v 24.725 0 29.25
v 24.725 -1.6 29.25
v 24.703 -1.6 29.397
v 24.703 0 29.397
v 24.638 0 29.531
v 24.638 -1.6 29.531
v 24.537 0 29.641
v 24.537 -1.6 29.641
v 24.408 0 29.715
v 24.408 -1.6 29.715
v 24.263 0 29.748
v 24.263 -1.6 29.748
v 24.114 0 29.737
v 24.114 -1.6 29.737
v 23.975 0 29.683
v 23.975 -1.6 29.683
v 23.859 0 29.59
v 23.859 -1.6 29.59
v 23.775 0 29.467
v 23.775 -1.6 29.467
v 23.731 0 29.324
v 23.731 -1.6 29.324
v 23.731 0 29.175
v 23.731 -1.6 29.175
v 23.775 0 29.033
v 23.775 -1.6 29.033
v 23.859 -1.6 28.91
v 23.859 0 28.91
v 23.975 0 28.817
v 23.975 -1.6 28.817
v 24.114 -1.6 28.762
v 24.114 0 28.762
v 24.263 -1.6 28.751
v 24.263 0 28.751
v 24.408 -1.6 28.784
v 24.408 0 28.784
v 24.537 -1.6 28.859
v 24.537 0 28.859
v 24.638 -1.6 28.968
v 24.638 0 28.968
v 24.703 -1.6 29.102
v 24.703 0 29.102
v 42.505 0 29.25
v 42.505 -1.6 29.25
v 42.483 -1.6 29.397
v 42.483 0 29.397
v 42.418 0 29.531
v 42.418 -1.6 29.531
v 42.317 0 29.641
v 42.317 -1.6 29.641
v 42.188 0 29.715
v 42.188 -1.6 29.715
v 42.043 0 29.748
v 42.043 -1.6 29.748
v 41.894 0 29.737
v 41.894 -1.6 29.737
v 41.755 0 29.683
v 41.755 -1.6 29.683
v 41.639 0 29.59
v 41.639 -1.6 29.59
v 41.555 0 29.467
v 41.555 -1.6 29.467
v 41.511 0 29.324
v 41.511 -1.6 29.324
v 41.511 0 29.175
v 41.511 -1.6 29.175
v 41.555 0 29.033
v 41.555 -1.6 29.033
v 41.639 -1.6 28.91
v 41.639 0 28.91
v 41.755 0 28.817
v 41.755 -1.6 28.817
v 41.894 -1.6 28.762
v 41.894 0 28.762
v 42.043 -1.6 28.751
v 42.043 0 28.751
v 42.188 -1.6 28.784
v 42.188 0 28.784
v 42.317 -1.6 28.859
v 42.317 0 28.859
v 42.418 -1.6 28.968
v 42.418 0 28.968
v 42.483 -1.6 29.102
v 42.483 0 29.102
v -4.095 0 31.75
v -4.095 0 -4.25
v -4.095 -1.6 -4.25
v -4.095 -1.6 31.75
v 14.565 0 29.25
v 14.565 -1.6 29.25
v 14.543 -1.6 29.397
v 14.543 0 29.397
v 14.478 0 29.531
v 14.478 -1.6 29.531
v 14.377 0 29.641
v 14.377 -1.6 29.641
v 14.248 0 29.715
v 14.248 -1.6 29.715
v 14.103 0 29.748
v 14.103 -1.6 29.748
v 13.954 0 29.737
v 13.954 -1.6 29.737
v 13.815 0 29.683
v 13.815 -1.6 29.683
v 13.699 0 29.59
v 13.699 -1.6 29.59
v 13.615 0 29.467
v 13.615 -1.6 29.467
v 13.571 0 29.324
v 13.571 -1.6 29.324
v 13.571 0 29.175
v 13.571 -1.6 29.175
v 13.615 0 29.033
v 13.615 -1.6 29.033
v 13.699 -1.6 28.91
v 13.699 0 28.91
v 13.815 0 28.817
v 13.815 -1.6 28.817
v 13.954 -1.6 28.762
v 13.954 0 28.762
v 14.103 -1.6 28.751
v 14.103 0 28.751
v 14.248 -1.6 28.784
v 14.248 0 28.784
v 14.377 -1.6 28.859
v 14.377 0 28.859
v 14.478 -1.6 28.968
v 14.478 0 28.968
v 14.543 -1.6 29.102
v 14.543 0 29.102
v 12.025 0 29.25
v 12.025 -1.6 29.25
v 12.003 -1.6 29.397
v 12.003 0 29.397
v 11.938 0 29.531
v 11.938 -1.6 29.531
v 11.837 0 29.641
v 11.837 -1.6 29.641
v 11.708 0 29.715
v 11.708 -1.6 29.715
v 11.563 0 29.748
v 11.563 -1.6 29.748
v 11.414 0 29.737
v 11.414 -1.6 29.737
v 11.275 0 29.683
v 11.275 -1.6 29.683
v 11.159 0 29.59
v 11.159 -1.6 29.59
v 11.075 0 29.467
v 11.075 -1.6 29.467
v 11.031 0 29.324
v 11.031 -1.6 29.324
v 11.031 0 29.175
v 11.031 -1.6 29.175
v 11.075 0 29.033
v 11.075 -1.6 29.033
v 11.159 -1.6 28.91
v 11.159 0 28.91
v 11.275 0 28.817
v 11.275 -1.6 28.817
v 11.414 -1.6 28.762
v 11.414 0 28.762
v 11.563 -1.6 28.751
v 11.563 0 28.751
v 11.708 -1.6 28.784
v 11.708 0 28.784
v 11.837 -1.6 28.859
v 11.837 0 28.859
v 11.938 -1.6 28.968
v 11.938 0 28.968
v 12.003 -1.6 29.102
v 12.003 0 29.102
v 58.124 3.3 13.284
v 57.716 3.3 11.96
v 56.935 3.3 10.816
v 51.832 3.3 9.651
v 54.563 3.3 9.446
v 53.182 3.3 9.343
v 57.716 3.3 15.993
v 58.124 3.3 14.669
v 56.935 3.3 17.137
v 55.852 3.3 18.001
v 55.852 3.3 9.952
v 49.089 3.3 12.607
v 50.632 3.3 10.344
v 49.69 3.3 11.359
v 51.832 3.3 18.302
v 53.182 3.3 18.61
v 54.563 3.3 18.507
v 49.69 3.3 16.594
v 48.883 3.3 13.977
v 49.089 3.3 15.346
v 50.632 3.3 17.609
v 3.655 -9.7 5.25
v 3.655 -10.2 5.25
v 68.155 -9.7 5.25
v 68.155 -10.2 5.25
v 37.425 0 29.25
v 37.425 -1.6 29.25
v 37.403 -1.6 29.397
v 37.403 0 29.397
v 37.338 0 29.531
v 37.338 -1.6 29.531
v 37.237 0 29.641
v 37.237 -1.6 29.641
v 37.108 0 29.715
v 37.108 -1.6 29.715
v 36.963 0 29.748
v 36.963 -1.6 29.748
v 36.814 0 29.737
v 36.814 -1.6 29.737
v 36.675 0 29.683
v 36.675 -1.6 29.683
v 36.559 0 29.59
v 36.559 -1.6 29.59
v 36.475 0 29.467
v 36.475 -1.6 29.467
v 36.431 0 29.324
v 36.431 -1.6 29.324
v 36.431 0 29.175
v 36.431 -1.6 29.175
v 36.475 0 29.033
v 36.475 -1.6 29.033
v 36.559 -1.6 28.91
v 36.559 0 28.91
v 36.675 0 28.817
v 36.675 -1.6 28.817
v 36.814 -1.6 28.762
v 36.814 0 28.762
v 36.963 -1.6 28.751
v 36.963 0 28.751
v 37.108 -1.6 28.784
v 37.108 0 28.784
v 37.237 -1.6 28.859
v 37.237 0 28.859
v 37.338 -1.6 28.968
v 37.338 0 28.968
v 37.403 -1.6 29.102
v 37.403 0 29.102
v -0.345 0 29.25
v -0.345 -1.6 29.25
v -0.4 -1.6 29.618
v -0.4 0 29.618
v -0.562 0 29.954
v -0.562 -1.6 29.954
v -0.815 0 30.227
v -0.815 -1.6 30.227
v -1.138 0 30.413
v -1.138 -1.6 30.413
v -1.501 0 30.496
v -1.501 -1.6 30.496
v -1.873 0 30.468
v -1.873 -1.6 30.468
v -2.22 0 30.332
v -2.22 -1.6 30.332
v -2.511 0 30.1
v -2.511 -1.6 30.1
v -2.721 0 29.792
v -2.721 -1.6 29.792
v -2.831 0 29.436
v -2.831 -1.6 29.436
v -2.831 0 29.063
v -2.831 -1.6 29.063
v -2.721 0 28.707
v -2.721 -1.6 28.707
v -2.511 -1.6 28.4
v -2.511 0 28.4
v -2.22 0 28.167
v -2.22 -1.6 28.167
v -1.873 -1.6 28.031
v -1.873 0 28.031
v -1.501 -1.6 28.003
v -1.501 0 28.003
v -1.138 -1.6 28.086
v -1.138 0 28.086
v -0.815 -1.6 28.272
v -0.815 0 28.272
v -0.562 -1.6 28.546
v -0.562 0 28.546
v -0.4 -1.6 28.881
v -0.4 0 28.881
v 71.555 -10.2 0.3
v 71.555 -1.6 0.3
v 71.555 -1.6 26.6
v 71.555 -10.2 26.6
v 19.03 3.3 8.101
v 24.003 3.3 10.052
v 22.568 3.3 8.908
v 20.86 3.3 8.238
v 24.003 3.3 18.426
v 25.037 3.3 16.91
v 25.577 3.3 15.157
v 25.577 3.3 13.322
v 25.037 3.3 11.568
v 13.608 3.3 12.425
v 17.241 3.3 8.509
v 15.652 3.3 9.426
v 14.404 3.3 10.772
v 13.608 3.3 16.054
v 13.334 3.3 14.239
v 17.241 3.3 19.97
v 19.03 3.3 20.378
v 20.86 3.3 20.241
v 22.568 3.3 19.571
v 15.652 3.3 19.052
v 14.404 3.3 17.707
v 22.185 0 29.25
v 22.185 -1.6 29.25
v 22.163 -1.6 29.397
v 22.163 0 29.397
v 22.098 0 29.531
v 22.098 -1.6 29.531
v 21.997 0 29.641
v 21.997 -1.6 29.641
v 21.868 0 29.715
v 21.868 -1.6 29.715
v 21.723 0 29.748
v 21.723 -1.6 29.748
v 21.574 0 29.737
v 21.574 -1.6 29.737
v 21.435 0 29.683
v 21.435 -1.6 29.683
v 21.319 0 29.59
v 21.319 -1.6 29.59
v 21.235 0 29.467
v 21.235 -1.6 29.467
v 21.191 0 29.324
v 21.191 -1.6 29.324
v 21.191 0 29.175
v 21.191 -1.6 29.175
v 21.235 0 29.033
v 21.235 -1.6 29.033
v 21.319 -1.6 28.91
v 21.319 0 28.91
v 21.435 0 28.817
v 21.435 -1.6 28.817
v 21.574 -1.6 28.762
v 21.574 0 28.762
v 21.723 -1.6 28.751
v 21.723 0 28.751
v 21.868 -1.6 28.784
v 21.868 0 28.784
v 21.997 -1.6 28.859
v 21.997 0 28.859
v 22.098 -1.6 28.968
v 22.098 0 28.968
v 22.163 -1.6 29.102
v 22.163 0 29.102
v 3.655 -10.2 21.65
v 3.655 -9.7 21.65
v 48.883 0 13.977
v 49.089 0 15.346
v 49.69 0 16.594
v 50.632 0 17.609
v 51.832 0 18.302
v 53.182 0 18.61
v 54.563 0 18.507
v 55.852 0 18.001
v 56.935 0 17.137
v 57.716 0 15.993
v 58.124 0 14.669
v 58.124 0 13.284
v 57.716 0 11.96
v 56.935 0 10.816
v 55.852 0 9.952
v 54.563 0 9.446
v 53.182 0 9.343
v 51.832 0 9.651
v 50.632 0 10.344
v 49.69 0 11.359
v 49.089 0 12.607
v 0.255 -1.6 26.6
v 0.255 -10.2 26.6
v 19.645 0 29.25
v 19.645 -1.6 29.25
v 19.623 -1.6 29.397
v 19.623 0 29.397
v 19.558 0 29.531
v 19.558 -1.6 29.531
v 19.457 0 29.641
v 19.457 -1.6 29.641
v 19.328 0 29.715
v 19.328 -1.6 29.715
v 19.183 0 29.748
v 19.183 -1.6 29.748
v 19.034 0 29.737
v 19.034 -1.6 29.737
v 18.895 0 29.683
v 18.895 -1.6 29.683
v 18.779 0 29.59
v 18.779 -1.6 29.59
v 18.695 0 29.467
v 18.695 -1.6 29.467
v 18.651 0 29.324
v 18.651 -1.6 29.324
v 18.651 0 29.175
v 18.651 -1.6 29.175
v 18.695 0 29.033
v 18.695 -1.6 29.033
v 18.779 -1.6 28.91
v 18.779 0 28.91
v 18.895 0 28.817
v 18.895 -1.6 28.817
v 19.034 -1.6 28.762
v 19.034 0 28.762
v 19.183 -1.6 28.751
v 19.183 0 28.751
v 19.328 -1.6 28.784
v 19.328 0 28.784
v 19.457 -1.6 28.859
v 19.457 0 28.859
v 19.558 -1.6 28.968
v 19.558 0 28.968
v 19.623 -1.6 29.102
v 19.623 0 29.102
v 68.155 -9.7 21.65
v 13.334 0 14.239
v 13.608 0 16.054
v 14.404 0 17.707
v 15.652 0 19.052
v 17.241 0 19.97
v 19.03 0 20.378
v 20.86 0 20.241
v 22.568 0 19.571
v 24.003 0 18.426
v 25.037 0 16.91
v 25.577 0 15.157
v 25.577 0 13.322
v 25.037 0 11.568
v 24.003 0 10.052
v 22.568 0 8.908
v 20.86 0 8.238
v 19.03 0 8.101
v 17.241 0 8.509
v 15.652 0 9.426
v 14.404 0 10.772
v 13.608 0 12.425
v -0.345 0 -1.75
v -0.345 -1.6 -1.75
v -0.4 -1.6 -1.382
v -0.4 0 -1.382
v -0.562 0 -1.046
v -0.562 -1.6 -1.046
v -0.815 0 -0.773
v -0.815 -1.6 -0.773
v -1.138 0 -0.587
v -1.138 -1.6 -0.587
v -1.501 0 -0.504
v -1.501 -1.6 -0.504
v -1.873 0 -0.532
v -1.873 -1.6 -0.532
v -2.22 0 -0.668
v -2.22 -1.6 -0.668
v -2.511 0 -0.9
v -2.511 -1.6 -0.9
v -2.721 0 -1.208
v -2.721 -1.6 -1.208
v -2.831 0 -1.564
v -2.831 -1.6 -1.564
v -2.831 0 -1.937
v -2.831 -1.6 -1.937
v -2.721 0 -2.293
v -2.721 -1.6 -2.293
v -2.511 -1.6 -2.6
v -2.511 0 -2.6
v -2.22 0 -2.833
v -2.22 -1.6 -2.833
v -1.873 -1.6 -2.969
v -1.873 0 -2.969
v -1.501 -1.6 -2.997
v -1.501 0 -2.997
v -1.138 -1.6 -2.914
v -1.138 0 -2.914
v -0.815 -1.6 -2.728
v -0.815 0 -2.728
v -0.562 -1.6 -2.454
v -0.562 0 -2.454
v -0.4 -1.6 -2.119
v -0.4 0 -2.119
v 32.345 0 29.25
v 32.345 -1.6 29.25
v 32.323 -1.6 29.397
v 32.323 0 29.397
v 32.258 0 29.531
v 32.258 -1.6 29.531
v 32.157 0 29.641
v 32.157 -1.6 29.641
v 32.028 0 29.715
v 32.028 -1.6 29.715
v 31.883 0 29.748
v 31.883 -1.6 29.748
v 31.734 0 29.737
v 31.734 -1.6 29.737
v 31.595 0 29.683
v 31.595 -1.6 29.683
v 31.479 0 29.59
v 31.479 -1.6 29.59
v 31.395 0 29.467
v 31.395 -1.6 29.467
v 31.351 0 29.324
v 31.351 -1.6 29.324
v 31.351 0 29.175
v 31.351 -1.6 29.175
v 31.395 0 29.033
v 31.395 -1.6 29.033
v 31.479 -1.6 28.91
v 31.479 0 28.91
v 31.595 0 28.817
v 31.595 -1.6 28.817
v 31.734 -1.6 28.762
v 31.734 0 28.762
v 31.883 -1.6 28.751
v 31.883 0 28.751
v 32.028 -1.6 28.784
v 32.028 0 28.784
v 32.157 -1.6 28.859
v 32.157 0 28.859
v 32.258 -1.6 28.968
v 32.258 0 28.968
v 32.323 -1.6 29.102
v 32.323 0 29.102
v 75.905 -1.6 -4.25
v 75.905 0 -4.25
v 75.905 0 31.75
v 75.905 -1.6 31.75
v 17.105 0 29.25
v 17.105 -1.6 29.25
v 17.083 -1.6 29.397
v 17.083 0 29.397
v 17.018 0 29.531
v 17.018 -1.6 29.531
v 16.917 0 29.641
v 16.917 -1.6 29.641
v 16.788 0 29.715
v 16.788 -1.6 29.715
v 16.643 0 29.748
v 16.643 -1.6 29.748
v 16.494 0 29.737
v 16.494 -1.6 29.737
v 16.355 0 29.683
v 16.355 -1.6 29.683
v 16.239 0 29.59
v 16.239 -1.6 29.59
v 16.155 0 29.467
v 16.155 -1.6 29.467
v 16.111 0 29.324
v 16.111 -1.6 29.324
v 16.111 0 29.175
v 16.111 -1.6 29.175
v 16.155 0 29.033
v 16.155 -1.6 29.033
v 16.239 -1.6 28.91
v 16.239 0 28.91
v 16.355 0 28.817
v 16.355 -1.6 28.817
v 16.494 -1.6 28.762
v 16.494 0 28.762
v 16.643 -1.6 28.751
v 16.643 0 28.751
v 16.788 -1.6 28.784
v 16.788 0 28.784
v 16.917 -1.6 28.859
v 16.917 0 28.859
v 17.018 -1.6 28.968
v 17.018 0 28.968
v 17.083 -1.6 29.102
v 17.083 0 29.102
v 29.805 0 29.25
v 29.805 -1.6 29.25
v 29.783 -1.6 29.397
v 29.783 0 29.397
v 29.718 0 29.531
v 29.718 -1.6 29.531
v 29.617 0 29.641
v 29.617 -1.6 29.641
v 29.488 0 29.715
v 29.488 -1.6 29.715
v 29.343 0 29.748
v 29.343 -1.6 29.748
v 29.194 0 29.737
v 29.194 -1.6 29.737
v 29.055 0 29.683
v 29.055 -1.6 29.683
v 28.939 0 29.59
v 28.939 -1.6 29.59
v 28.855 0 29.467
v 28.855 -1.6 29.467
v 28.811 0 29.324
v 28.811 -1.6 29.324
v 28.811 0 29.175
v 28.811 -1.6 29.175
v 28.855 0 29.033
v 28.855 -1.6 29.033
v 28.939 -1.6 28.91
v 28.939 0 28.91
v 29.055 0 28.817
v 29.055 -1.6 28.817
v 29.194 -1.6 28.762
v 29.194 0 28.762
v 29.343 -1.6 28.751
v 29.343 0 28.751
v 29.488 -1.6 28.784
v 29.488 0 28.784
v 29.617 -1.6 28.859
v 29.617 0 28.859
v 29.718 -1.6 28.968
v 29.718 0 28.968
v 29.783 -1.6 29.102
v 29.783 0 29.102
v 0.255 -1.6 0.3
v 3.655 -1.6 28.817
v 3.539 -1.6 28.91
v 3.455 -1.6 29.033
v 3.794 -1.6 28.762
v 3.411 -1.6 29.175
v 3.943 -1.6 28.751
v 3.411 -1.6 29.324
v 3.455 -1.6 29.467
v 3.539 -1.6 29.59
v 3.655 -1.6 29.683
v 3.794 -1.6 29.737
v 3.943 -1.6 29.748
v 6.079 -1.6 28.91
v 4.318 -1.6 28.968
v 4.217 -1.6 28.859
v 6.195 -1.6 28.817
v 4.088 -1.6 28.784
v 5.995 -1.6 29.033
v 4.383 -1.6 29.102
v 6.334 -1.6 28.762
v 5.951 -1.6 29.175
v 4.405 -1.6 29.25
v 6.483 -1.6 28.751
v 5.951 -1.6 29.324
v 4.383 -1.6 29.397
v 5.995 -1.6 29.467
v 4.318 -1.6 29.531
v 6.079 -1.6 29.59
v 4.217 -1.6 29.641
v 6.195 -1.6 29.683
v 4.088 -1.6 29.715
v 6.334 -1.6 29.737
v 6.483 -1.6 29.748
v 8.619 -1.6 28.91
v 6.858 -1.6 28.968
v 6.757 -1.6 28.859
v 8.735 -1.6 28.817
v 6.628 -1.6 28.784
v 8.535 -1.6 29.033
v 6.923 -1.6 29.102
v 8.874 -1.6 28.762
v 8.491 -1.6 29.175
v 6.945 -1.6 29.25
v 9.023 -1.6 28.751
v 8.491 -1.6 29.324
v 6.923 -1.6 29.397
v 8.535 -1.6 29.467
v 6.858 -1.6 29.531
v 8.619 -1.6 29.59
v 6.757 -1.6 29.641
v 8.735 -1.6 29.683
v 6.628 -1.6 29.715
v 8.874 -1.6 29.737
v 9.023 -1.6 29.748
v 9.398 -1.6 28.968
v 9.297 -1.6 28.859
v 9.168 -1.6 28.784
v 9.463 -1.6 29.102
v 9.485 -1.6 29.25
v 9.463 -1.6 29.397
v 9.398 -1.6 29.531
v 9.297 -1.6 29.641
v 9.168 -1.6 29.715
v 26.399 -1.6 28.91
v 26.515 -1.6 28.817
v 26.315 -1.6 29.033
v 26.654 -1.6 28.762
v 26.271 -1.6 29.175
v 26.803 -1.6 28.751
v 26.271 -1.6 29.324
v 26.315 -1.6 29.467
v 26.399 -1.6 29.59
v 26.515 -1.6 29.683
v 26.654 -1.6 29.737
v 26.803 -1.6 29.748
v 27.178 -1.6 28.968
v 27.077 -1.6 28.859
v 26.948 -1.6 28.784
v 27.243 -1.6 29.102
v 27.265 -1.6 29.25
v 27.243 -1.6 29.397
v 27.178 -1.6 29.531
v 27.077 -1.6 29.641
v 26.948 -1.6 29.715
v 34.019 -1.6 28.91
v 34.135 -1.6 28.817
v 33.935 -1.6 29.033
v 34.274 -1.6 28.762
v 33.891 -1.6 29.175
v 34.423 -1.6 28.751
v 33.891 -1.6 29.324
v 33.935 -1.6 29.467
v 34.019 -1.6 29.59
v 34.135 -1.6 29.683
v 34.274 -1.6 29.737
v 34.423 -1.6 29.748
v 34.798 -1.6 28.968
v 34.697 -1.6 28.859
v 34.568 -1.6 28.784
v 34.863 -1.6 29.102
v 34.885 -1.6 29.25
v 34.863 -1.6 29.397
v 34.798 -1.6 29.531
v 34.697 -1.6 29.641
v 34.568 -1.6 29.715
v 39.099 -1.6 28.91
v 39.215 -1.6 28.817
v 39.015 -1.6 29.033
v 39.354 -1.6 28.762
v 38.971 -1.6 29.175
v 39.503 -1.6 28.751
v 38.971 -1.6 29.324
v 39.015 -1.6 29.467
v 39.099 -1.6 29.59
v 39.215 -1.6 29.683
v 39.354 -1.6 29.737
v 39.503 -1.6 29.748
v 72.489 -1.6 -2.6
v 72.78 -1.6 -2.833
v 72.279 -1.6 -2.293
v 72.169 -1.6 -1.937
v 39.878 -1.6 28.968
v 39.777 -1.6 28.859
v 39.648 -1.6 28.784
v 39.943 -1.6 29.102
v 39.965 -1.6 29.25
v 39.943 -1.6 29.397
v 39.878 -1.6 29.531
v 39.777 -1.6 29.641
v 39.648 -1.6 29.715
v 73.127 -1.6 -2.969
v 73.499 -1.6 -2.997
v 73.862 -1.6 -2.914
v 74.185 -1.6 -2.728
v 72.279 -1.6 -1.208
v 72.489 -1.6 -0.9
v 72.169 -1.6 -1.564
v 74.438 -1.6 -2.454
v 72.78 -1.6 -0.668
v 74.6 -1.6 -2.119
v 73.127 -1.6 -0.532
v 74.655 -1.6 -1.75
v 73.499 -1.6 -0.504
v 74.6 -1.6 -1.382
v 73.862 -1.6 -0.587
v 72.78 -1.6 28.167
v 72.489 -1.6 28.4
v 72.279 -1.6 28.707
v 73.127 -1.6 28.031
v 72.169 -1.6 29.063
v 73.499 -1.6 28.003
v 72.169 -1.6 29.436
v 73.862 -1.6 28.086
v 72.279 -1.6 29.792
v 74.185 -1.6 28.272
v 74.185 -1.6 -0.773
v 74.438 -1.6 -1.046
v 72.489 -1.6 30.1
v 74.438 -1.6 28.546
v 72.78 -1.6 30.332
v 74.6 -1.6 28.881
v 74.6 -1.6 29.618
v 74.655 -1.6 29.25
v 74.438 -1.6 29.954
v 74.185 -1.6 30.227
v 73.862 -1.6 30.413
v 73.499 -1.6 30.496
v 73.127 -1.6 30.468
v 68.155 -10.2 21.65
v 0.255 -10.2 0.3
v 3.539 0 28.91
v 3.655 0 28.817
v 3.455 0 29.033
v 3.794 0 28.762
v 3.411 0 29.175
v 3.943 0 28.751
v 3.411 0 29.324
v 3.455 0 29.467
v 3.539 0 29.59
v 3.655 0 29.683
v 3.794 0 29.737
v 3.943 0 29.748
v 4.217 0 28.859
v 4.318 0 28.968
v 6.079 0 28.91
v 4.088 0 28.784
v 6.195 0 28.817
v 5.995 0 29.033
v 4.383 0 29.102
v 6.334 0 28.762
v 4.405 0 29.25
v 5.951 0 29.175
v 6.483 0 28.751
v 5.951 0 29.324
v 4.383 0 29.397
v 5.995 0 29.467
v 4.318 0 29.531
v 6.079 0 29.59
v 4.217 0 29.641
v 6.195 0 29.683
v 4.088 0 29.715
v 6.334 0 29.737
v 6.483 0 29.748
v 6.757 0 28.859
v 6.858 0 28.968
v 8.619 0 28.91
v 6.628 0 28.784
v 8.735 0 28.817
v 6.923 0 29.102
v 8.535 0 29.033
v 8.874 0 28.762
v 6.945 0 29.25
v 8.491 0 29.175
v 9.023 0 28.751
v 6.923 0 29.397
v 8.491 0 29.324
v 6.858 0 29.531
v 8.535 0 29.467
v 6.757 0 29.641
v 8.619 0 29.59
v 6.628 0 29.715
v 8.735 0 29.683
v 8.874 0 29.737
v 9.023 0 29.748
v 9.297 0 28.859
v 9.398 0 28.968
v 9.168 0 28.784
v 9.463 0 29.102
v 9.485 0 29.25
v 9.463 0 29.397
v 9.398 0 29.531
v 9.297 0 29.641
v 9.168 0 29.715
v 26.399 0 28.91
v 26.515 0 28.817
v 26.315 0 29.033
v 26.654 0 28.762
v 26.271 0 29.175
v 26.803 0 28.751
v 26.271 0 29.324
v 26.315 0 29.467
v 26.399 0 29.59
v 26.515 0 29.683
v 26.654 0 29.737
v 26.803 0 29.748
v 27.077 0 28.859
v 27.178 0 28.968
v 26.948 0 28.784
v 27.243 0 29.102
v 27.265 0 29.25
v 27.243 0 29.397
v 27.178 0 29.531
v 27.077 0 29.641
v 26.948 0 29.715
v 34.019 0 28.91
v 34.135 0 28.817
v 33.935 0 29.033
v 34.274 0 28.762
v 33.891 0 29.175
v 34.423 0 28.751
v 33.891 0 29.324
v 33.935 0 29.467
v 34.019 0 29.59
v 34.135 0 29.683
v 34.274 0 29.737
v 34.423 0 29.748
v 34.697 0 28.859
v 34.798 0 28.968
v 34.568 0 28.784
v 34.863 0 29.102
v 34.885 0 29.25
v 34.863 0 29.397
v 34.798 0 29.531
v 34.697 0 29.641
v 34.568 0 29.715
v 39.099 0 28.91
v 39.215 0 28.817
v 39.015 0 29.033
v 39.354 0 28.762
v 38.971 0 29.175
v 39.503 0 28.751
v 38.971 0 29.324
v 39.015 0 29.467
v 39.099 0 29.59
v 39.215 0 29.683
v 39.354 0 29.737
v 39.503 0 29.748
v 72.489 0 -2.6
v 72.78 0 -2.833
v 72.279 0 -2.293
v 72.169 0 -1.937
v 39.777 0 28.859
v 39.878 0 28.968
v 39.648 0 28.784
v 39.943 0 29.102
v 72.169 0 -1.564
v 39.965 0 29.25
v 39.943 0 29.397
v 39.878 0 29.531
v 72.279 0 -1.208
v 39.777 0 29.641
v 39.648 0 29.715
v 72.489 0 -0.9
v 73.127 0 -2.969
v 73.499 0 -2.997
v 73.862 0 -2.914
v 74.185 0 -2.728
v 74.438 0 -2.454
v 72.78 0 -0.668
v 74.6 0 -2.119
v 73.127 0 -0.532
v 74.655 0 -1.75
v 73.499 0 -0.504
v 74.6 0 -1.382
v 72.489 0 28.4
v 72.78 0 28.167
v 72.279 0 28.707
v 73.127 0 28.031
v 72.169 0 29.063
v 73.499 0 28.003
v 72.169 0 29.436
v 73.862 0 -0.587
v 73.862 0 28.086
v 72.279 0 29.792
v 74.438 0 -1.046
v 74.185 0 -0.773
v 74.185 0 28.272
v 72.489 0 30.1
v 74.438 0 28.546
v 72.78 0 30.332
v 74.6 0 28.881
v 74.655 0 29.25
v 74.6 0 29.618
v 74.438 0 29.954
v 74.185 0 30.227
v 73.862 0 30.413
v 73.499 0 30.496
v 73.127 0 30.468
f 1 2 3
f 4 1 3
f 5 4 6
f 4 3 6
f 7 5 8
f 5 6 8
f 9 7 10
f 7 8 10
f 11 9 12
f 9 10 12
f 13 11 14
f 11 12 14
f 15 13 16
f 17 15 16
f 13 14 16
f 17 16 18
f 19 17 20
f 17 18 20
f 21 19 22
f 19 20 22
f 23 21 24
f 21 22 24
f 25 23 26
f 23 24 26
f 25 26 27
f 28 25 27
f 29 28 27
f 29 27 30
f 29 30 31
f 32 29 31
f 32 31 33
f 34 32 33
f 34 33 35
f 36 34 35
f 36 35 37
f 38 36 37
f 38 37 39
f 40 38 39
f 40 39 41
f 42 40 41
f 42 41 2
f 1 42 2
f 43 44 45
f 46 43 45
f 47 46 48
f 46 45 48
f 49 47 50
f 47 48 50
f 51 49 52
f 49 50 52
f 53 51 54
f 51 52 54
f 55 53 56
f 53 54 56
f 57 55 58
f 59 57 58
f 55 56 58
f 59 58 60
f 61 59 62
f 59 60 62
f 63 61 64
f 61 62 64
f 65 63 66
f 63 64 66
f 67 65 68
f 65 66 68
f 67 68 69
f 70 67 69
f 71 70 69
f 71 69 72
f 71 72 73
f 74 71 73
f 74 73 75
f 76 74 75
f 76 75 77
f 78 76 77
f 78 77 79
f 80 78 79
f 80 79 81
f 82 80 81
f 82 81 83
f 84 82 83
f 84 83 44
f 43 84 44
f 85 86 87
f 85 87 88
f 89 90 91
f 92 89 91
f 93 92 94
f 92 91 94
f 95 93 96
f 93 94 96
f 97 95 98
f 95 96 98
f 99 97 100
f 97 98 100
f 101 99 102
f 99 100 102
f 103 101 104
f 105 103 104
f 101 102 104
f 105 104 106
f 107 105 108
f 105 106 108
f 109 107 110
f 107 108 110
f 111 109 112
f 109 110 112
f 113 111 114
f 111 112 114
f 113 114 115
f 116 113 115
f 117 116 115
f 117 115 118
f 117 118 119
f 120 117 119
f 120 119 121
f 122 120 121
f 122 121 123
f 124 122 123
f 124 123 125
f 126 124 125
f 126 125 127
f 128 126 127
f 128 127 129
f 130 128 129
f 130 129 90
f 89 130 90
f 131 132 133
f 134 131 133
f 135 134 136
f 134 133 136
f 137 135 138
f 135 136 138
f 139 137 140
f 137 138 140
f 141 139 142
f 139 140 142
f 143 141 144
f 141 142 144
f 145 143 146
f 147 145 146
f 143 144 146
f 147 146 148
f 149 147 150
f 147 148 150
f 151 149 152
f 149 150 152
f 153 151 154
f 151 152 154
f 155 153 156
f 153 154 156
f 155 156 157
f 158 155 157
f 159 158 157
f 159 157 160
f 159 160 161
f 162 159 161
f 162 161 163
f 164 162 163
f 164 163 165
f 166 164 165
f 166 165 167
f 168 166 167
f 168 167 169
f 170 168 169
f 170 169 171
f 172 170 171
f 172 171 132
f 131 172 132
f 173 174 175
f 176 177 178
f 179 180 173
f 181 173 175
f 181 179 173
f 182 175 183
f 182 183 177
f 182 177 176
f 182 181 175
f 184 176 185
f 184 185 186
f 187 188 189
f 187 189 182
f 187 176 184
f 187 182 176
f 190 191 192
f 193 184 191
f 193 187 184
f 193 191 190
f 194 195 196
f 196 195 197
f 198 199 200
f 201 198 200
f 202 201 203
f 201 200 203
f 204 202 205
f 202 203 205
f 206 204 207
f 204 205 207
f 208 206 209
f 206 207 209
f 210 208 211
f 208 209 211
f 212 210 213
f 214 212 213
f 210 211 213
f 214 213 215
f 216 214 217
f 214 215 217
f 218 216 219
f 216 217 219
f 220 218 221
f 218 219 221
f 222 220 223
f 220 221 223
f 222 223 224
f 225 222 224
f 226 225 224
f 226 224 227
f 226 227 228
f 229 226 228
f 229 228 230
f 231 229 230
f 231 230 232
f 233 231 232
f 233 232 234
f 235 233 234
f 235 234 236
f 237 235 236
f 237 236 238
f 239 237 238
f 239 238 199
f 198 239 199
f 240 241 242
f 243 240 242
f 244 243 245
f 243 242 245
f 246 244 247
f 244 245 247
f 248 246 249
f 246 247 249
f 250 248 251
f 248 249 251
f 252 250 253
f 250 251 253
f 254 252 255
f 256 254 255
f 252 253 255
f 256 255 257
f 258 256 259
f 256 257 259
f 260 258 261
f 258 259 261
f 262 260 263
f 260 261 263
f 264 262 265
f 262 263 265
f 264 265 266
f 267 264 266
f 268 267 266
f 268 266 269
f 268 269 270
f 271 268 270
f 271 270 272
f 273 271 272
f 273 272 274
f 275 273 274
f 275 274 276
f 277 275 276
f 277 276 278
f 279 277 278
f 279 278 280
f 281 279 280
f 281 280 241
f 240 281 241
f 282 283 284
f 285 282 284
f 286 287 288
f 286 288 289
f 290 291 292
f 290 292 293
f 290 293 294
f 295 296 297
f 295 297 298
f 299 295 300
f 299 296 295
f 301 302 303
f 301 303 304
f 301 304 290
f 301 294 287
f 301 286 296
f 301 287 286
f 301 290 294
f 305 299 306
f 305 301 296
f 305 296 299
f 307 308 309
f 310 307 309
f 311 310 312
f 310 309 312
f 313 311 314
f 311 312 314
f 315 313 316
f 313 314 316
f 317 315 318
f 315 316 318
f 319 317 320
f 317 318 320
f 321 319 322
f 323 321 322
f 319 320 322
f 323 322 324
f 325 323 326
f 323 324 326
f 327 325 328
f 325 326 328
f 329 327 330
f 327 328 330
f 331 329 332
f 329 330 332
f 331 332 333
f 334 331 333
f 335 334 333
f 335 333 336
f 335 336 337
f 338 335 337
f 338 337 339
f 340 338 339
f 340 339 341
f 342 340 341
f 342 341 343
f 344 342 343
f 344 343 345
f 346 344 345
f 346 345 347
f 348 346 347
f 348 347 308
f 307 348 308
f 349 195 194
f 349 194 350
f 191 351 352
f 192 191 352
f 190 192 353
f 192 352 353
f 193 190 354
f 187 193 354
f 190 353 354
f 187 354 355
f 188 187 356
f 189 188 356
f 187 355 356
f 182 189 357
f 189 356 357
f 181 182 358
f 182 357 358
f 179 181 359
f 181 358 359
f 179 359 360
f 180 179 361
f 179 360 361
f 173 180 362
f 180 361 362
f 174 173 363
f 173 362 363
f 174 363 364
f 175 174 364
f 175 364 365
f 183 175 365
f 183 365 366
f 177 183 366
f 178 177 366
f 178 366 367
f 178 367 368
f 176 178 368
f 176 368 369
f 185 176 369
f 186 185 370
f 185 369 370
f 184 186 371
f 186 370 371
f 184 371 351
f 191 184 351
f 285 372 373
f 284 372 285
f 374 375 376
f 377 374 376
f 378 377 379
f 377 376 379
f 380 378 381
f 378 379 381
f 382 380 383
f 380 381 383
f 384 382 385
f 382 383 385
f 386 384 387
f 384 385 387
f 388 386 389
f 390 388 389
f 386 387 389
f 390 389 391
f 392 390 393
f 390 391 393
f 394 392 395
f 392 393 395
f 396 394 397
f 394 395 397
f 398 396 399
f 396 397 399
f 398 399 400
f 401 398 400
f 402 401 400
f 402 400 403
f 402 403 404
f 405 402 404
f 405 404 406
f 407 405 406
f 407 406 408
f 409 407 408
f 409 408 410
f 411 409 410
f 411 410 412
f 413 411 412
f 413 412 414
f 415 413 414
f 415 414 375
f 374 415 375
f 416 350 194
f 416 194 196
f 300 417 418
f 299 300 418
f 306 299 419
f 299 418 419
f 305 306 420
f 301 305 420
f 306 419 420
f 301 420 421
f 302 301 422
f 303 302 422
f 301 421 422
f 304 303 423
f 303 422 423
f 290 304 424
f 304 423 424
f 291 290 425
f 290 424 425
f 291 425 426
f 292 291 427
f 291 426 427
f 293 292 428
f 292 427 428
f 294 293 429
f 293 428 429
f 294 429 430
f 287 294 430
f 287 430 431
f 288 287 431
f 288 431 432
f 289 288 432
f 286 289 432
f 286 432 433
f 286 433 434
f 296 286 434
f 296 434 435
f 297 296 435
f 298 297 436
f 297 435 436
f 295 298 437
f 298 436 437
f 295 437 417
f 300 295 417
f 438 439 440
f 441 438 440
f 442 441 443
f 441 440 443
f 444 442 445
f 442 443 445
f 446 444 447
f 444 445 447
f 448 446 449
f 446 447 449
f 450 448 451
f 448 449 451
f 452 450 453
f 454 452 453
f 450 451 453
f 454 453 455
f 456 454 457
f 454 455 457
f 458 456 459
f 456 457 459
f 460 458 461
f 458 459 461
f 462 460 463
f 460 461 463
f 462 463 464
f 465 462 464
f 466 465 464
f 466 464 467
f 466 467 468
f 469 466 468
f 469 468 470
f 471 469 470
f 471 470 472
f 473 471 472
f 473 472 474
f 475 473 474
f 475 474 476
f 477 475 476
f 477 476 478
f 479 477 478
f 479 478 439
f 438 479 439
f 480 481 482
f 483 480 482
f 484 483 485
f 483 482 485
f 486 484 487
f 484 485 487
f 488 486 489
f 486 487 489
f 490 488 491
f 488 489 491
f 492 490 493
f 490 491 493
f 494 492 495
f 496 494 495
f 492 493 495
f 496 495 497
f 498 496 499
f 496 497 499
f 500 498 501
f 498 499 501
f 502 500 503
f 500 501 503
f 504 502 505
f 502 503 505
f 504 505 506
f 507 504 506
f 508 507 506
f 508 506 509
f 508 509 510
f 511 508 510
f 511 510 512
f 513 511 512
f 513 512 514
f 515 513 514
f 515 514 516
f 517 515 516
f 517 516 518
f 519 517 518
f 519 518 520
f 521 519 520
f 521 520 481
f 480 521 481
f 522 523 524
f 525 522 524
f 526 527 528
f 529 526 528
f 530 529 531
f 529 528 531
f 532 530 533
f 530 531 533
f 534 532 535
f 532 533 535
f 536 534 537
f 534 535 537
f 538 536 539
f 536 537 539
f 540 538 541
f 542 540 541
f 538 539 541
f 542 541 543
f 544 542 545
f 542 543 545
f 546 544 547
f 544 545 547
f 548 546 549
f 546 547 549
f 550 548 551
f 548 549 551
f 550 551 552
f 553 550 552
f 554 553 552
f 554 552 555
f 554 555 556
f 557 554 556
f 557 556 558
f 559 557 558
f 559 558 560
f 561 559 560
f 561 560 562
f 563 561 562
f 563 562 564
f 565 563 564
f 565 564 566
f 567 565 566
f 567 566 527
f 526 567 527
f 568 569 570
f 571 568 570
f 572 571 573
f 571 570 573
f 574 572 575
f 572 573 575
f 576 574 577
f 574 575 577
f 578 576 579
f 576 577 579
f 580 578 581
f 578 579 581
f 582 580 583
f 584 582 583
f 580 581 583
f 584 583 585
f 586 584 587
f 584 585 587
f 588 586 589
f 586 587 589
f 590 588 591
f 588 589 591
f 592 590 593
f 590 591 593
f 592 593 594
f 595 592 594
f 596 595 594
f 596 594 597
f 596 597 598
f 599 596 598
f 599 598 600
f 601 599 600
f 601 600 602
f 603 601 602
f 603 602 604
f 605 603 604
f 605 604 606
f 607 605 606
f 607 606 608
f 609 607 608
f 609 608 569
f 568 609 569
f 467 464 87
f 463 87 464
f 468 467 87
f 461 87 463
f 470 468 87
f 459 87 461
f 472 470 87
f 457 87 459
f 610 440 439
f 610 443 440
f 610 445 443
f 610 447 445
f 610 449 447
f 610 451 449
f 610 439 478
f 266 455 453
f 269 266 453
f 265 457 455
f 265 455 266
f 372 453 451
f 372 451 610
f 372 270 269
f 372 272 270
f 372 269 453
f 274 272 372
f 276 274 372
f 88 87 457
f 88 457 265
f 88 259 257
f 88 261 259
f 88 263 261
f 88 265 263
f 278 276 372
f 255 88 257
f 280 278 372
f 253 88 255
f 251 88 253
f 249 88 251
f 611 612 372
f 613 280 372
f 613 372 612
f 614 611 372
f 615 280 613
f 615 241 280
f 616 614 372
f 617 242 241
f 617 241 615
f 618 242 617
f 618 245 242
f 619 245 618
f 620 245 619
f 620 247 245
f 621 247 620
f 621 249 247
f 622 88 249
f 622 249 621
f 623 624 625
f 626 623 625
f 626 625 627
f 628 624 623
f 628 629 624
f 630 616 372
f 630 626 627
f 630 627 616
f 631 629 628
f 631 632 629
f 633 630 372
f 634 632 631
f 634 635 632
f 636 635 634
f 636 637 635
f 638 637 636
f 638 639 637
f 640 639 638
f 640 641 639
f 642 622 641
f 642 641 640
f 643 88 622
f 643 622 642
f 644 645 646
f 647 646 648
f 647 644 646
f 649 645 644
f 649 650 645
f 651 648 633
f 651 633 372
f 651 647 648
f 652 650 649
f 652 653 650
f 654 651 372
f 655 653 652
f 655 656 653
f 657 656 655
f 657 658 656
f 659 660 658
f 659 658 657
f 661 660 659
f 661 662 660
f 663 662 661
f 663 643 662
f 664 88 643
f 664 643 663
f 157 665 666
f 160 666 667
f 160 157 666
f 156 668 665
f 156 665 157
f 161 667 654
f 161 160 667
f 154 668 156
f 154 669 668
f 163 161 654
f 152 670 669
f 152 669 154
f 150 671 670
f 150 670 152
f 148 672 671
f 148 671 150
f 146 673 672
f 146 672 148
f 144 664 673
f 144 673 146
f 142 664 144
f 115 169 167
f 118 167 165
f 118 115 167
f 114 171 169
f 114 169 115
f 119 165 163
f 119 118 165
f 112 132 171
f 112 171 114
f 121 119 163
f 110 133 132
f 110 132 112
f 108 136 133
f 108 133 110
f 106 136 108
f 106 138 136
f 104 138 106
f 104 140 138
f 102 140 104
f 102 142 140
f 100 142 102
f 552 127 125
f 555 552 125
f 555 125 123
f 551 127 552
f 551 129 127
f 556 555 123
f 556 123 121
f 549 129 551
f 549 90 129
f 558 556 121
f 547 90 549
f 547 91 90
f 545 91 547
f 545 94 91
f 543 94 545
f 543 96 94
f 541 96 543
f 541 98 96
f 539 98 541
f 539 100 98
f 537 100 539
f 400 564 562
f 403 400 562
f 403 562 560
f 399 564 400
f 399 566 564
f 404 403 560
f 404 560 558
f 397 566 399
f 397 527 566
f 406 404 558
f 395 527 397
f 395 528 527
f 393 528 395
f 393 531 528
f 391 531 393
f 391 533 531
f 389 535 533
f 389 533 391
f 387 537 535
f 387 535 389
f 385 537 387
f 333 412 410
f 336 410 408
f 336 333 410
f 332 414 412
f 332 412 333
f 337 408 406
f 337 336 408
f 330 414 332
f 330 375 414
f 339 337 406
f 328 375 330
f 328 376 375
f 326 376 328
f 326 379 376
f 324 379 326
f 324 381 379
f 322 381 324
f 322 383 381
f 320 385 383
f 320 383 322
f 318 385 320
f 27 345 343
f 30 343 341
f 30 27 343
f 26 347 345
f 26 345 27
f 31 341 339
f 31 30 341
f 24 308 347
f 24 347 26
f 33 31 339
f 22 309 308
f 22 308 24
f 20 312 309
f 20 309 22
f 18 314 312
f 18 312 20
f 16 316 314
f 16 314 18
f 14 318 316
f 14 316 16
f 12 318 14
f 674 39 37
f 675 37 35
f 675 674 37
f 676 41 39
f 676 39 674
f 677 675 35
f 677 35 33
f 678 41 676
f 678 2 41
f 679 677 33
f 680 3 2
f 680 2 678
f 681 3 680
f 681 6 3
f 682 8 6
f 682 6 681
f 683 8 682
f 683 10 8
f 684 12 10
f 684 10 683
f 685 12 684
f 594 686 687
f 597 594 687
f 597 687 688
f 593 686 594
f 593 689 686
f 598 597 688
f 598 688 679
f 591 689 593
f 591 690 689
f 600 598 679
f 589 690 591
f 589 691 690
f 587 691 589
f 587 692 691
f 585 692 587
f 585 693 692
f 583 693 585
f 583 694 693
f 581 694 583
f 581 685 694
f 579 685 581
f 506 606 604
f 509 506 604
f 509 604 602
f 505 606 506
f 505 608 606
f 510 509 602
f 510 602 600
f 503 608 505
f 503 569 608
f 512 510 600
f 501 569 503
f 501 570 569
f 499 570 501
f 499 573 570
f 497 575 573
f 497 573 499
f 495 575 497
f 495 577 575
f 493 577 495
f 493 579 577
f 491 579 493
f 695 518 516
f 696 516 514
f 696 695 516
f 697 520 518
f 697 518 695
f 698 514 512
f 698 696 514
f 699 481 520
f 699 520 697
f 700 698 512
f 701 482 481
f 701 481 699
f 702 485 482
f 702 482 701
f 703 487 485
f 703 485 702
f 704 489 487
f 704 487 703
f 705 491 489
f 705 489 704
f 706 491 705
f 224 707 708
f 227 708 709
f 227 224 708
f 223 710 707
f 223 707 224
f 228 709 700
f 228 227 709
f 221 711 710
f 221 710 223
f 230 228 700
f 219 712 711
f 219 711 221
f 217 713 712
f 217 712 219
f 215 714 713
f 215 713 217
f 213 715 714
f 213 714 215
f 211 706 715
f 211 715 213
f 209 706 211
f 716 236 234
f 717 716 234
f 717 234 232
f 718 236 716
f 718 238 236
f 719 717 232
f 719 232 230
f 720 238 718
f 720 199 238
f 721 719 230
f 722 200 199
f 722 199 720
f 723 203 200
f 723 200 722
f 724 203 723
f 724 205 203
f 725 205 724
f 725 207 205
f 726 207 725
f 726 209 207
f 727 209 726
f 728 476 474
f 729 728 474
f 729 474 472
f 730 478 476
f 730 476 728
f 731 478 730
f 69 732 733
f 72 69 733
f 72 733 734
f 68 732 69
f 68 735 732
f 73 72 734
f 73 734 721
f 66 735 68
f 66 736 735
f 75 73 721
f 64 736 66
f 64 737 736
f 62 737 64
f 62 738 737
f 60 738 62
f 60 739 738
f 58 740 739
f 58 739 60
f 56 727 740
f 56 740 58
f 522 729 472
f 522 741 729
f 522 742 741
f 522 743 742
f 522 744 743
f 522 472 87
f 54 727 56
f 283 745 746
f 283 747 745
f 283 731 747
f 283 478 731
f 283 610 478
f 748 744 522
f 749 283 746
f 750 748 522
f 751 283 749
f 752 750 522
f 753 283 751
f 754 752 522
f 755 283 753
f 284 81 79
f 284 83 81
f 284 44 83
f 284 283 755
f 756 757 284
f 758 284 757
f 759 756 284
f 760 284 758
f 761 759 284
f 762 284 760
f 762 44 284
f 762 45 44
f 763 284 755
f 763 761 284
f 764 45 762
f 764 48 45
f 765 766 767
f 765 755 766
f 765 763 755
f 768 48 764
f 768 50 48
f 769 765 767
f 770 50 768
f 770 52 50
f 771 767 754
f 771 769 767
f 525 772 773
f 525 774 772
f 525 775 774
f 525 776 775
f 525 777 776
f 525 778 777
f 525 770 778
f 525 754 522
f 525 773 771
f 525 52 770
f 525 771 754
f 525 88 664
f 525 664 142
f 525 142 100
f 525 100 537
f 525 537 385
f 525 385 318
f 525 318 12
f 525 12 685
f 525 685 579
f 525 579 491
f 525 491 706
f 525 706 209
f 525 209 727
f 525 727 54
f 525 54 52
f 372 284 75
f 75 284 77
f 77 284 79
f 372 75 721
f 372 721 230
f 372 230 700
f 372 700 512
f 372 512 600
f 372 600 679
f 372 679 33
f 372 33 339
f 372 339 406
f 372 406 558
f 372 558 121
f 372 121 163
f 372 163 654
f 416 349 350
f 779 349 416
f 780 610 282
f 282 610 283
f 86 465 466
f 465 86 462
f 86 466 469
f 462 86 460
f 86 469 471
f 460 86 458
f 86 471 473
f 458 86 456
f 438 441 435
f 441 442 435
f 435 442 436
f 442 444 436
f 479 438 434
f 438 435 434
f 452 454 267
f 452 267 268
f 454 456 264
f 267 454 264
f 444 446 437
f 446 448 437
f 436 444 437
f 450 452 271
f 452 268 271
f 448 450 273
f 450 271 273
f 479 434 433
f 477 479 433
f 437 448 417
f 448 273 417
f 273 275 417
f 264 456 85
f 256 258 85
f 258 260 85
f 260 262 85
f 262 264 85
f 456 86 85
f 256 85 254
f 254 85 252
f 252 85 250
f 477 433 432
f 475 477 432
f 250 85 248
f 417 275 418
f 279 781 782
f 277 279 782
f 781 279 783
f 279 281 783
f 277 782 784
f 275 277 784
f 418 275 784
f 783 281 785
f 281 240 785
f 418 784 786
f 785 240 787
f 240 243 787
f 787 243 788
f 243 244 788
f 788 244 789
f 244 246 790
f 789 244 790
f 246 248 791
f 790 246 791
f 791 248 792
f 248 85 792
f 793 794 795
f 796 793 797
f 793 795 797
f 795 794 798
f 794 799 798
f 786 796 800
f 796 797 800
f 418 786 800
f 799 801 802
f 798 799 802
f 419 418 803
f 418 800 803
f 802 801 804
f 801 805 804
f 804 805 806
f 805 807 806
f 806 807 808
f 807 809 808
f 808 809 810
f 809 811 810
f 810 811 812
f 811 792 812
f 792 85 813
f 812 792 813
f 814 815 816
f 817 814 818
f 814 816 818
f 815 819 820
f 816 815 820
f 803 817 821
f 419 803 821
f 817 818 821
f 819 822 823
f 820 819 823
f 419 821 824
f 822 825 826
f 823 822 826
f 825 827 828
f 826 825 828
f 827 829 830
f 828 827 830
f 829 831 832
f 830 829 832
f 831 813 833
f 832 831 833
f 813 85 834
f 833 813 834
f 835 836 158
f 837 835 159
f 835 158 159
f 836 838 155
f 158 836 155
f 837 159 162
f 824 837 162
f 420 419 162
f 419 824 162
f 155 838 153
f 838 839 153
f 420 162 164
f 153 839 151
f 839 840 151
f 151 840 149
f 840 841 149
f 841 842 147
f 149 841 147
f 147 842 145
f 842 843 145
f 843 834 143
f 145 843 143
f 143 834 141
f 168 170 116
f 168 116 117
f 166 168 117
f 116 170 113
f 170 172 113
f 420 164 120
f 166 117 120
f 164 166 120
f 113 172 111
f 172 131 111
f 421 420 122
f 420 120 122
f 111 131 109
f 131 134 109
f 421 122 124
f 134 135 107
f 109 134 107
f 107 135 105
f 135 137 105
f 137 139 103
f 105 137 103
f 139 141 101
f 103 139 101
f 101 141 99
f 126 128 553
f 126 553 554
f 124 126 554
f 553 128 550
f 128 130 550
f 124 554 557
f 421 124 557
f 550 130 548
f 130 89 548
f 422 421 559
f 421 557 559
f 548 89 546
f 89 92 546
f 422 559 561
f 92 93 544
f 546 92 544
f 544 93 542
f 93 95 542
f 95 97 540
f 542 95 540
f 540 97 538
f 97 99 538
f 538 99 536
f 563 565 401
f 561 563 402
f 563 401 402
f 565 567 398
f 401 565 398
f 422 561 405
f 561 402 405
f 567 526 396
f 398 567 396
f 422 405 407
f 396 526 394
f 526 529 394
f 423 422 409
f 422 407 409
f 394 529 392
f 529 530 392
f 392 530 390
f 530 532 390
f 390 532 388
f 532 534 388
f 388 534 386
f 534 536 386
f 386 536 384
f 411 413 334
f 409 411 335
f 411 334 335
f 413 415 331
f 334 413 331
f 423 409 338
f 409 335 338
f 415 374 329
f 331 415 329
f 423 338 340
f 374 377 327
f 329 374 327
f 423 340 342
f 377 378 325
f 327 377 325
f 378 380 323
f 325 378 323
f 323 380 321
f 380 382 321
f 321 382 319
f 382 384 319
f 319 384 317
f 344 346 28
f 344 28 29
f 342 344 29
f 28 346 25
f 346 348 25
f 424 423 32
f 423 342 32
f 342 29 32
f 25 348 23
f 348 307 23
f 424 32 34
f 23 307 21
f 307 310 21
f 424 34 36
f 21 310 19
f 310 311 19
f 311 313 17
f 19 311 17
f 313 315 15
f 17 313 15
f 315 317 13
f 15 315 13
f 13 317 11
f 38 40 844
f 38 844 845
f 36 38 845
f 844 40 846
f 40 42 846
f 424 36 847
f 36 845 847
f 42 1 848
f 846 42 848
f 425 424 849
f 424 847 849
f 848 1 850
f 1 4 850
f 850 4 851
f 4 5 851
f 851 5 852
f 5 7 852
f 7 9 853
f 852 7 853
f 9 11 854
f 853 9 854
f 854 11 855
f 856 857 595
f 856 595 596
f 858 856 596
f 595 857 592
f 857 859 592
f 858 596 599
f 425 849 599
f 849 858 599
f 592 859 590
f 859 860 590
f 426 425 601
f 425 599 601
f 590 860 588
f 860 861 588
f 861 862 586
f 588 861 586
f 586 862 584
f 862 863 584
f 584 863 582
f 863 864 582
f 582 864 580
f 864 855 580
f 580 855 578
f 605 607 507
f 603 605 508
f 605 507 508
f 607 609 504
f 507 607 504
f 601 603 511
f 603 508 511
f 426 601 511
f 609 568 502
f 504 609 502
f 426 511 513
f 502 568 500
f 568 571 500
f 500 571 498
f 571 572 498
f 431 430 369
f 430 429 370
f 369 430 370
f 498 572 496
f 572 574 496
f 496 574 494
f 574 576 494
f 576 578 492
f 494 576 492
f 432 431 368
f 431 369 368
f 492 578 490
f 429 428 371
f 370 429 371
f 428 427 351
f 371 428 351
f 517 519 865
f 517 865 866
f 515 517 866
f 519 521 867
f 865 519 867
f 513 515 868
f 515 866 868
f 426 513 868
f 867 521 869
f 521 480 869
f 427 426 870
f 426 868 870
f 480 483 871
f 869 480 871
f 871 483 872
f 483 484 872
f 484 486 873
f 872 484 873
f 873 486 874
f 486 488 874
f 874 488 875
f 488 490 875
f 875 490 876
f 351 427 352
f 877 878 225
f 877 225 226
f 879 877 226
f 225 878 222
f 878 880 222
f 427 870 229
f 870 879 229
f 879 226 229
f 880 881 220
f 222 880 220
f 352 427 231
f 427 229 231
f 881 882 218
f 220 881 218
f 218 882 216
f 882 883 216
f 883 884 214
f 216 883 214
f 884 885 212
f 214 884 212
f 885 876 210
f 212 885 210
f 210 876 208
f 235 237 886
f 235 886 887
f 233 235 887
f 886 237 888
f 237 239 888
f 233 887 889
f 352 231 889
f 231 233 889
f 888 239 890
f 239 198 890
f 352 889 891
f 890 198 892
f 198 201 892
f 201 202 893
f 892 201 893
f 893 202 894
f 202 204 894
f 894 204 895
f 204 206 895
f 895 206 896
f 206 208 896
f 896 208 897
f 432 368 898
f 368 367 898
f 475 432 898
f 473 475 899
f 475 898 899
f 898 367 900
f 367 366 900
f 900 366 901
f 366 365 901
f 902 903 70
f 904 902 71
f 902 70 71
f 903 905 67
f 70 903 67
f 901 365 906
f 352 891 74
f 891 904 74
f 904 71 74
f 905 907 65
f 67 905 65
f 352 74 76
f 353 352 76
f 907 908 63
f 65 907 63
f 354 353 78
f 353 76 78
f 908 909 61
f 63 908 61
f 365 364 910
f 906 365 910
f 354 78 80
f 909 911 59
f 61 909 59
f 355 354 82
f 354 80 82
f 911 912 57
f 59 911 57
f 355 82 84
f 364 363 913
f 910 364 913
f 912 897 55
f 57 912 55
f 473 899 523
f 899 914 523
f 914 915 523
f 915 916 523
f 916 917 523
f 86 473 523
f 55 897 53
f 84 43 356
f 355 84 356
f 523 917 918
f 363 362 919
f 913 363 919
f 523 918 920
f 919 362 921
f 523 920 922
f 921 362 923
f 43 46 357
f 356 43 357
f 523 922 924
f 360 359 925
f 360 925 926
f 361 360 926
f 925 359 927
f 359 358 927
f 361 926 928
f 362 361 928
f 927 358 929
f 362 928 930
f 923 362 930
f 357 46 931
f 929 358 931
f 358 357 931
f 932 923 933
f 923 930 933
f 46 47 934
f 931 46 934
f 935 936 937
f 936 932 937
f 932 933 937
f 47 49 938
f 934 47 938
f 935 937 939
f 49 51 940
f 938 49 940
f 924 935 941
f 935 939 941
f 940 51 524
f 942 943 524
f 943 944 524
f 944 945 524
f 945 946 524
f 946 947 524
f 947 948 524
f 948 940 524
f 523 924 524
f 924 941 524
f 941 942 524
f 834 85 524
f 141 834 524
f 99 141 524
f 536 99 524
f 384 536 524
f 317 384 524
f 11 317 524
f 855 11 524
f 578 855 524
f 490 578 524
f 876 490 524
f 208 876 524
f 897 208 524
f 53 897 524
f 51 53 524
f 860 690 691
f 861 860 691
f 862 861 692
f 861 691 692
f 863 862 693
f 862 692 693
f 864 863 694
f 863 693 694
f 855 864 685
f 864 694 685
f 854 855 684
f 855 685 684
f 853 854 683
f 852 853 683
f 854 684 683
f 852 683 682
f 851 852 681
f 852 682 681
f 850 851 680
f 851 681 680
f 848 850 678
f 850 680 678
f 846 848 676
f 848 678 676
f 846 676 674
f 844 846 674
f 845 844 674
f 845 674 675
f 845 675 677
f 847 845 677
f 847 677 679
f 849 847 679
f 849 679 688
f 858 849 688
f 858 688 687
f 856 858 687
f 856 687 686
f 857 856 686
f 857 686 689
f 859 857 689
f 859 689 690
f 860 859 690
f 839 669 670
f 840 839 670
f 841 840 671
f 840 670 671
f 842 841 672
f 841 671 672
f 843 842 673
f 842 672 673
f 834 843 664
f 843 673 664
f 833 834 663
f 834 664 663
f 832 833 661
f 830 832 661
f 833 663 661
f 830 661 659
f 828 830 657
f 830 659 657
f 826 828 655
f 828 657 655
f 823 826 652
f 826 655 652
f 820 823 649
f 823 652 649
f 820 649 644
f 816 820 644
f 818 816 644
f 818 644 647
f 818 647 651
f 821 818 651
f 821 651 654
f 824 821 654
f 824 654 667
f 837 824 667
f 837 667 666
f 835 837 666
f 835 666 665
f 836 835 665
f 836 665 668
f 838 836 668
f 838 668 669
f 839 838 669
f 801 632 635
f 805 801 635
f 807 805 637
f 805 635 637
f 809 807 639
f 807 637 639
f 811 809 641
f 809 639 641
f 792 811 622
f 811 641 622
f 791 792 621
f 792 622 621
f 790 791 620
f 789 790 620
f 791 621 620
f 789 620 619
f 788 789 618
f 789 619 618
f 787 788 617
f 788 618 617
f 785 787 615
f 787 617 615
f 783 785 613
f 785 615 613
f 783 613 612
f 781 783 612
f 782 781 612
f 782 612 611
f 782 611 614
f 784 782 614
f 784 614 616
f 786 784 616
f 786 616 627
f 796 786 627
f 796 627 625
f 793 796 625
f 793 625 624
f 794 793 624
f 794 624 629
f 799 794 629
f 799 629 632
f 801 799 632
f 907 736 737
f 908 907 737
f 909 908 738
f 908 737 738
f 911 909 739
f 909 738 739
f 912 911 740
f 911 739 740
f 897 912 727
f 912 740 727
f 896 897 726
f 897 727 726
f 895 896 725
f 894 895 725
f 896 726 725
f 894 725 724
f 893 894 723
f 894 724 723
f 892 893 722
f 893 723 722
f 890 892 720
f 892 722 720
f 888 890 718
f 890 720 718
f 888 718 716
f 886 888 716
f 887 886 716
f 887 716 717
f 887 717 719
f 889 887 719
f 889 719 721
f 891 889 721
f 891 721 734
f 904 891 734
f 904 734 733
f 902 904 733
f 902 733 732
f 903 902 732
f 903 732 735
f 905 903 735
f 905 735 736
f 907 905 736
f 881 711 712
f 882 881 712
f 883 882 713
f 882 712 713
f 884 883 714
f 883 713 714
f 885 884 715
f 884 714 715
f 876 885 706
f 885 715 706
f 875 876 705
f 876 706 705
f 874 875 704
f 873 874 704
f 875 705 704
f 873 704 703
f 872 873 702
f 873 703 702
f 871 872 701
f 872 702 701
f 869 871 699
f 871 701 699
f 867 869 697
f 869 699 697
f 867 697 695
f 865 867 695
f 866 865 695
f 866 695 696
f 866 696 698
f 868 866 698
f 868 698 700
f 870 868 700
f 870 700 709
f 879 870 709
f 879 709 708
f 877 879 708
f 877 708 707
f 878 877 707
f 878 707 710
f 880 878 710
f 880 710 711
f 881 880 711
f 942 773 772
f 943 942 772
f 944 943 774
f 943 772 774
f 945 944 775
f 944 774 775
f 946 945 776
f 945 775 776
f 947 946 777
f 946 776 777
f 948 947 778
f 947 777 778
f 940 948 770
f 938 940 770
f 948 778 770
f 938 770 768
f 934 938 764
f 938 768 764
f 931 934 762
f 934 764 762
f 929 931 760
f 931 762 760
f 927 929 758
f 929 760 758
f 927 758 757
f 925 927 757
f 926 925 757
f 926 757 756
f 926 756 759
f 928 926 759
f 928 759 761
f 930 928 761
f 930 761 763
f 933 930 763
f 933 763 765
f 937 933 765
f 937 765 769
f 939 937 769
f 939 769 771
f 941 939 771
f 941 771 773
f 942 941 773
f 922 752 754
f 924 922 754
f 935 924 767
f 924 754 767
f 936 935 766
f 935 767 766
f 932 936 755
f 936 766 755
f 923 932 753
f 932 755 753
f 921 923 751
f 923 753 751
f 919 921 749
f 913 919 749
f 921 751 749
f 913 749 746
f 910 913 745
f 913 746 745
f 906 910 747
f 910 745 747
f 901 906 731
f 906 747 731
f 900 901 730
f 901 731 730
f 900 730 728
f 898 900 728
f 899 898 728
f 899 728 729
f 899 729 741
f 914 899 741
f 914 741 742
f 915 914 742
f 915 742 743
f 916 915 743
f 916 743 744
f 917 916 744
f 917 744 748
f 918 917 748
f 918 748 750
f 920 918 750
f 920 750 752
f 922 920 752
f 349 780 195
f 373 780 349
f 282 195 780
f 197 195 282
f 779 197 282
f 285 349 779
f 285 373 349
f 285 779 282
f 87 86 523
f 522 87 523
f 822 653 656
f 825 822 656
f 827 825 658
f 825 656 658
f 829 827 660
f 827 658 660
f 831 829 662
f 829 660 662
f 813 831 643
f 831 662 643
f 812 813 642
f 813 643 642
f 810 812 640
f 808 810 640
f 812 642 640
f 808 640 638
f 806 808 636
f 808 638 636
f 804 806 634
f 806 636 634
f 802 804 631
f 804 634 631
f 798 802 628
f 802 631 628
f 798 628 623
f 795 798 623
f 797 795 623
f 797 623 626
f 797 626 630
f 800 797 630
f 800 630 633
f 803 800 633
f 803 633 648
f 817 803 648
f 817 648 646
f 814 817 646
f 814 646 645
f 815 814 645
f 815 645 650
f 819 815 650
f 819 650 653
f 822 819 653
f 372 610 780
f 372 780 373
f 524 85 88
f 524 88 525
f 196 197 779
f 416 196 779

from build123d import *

# Parameters (mm, degrees)
F0_W      = 80
F0_H      = 36
F1_DEPTH  = 1.6
F2_W      = 71.3
F2_H      = 26.3
F3_DEPTH  = 8.6
F4_W      = 64.5
F4_H      = 16.4
F5_DEPTH  = 0.5
F6_R      = 1.25
F7_DEPTH  = 1.601
F8_R      = 0.5
F9_DEPTH  = 1.601
F10_R     = 4.646555
F10_R_2   = 6.155936
F11_DEPTH = 3.3


with BuildPart() as f1:
    # F0 (on Front) → F1 (new body)
    with BuildSketch(Plane.XZ):
        with Locations((35.905228, 13.74974)):
            Rectangle(F0_W, F0_H)
    extrude(amount=F1_DEPTH)

    # F2 (on face) → F3 (join)
    with BuildSketch(Plane.XZ.offset(1.6)):
        with Locations((35.905228, 13.44974)):
            Rectangle(F2_W, F2_H)
    extrude(amount=F3_DEPTH)

    # F4 (on face) → F5 (cut)
    with BuildSketch(Plane.XZ.offset(10.2)):
        with Locations((35.905228, 13.44974)):
            Rectangle(F4_W, F4_H)
    extrude(amount=-F5_DEPTH, mode=Mode.SUBTRACT)

    # F6 (on face) → F7 (cut, through all)
    with BuildSketch(Plane.XZ.offset(1.6)):
        with Locations((-1.594772, 29.24974)):
            Circle(F6_R)
        with Locations((73.405228, 29.24974)):
            Circle(F6_R)
        with Locations((73.405228, -1.75026)):
            Circle(F6_R)
        with Locations((-1.594772, -1.75026)):
            Circle(F6_R)
    extrude(amount=-F7_DEPTH, mode=Mode.SUBTRACT)

    # F8 (on face) → F9 (cut, through all)
    with BuildSketch(Plane.XZ.offset(1.6)):
        with Locations((3.905228, 29.24974)):
            Circle(F8_R)
        with Locations((6.445228, 29.24974)):
            Circle(F8_R)
        with Locations((8.985228, 29.24974)):
            Circle(F8_R)
        with Locations((11.525228, 29.24974)):
            Circle(F8_R)
        with Locations((14.065228, 29.24974)):
            Circle(F8_R)
        with Locations((16.605228, 29.24974)):
            Circle(F8_R)
        with Locations((19.145228, 29.24974)):
            Circle(F8_R)
        with Locations((21.685228, 29.24974)):
            Circle(F8_R)
        with Locations((24.225228, 29.24974)):
            Circle(F8_R)
        with Locations((26.765228, 29.24974)):
            Circle(F8_R)
        with Locations((29.305228, 29.24974)):
            Circle(F8_R)
        with Locations((31.845228, 29.24974)):
            Circle(F8_R)
        with Locations((34.385228, 29.24974)):
            Circle(F8_R)
        with Locations((36.925228, 29.24974)):
            Circle(F8_R)
        with Locations((39.465228, 29.24974)):
            Circle(F8_R)
        with Locations((42.005228, 29.24974)):
            Circle(F8_R)
    extrude(amount=-F9_DEPTH, mode=Mode.SUBTRACT)

    # F10 (on face) → F11 (join)
    with BuildSketch(Plane(origin=(0, 0, 0), x_dir=(-1, 0, 0), z_dir=(0, 1, 0))):
        with Locations((-53.529158, 13.976525)):
            Circle(F10_R)
        with Locations((-19.490262, 14.239374)):
            Circle(F10_R_2)
    extrude(amount=F11_DEPTH)


solid = f1.part
